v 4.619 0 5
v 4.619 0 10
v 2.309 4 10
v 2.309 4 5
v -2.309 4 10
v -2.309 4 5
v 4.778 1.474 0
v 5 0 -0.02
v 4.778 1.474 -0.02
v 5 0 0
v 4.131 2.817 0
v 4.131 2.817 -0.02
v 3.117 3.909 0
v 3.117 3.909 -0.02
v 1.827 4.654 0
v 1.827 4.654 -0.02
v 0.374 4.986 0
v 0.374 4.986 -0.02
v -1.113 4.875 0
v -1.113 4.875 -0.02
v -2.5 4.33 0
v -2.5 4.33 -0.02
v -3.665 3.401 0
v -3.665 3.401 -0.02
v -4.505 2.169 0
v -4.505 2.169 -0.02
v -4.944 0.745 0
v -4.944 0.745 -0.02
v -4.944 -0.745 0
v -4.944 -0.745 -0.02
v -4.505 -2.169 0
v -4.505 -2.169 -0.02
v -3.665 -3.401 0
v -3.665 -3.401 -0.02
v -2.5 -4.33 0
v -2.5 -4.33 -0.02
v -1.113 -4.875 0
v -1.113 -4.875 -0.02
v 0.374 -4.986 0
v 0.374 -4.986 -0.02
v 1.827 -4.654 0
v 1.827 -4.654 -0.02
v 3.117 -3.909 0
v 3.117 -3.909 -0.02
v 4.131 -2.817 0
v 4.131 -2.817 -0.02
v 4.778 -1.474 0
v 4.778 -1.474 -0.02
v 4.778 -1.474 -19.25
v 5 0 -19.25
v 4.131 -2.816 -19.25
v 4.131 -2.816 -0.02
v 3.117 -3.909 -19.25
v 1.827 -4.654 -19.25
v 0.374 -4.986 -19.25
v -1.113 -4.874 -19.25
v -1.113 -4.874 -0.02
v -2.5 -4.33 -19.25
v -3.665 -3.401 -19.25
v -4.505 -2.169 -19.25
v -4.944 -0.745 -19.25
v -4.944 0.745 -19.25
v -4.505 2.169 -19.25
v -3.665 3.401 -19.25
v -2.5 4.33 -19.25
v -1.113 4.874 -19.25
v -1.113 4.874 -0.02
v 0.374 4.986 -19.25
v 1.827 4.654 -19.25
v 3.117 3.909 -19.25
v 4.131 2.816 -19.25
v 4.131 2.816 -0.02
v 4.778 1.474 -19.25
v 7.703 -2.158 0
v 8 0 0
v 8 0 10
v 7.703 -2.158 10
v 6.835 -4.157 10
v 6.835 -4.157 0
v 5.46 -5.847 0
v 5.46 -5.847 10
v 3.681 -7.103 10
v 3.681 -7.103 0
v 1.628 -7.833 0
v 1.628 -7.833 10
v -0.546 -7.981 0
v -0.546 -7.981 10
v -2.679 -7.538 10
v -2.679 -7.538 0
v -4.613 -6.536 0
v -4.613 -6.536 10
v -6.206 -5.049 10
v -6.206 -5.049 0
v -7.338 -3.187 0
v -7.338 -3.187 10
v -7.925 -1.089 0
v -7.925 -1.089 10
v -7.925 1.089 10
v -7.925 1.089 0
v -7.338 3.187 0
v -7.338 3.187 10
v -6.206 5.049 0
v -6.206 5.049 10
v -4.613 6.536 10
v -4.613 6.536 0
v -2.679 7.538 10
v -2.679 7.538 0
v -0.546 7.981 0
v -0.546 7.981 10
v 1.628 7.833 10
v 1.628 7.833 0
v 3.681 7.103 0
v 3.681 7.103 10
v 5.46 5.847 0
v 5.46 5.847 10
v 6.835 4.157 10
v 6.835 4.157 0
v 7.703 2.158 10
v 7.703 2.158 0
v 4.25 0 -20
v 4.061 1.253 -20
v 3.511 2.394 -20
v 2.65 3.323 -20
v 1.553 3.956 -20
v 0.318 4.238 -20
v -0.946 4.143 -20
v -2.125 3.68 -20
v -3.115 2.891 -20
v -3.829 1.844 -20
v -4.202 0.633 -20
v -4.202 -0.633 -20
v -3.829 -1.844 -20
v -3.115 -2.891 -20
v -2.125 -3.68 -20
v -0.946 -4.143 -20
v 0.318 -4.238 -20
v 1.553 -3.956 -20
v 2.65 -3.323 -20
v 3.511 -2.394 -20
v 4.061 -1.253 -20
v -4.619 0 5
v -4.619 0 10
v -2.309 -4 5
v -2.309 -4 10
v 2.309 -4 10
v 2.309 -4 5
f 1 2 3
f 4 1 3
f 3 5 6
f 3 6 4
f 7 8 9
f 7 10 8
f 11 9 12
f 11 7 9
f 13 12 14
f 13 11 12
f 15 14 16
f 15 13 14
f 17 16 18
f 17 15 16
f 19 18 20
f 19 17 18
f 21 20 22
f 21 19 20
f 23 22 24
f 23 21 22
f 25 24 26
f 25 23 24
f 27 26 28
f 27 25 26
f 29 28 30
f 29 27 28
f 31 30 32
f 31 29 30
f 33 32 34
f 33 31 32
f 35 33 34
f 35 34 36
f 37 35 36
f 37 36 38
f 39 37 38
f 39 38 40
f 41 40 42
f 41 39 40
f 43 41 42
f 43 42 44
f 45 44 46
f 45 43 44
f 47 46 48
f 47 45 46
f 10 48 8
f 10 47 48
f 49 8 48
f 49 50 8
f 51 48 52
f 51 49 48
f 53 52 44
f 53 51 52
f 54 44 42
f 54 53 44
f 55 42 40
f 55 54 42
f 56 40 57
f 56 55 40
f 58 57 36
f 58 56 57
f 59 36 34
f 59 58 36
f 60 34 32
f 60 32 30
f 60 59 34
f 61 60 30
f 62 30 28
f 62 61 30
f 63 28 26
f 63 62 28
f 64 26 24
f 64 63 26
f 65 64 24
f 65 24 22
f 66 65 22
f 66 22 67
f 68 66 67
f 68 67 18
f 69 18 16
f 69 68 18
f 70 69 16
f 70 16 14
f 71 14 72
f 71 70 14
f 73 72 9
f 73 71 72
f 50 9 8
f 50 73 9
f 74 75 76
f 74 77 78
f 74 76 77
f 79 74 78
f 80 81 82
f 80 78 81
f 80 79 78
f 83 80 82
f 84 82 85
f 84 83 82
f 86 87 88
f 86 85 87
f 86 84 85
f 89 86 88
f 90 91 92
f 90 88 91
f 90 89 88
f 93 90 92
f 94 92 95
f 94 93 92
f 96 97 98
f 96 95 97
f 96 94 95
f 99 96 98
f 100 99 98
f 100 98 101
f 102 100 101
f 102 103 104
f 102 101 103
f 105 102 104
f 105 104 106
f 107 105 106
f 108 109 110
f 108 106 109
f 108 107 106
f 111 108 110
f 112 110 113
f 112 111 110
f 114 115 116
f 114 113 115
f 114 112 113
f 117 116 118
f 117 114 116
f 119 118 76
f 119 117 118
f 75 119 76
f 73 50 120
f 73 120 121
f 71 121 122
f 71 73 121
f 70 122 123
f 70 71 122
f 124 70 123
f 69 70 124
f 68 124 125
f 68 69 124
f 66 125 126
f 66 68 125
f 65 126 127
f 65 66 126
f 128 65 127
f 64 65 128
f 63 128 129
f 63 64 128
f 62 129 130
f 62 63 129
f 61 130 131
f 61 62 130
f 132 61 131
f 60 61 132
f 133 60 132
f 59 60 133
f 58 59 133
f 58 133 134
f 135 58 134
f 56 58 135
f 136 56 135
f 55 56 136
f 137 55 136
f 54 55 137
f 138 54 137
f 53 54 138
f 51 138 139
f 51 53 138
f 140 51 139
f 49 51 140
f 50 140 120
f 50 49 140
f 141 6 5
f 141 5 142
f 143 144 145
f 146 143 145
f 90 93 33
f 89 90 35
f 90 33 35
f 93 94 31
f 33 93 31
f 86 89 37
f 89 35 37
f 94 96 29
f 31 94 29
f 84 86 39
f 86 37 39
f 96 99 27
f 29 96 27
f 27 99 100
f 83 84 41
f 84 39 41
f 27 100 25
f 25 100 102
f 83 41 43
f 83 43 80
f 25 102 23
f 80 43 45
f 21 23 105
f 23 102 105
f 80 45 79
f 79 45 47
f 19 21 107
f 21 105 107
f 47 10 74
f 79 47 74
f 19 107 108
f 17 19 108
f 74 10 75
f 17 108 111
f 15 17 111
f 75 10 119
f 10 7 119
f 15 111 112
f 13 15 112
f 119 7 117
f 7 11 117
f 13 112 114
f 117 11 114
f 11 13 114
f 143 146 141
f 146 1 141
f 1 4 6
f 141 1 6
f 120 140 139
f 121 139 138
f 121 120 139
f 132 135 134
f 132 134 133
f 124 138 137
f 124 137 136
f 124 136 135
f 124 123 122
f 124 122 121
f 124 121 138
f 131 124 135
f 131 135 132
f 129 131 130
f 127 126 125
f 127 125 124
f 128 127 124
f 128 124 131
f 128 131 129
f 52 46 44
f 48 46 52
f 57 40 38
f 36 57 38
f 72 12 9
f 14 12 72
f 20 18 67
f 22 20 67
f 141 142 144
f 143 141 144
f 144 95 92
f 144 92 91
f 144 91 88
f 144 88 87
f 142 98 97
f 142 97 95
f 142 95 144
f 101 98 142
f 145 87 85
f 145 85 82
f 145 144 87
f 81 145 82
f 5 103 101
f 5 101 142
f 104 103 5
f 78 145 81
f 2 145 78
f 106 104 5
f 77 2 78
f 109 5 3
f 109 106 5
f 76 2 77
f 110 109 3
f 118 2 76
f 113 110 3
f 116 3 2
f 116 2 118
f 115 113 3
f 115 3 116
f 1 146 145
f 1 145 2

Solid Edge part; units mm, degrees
sketch "Sketch1" plane through (0, 0, 0) normal (0, 0, 1) x (1, 0, 0)
  circle A0 centre (0, 0) radius 8
  dimension "D1" = 16
extrude "Protrusion1" add sketch "Sketch1" along normal blind 10
sketch "Sketch2" plane through (0, 0, 0) normal (0, 0, -1) x (1, 0, 0)
  circle A0 centre (0, 0) radius 5
extrude "Protrusion2" add sketch "Sketch2" along normal blind 20
sketch "Sketch3" plane through (0, 0, -20) normal (0, 0, -1) x (1, 0, 0)
  circle A0 centre (0, 0) radius 4.9997
extrude "Cutout1" cut sketch "Sketch3" against normal blind 19.98 flip side to cut
chamfer "Chamfer_1" distance 0.75 angle 45 1 edges at (-4.9997, 0, -20)
sketch "Sketch4" plane through (0, 0, 10) normal (0, 0, 1) x (1, 0, 0)
  line L0 (-2.3094, 4) -> (2.3094, 4)
  line L1 (4.6188, 0) -> (2.3094, 4)
  line L2 (2.3094, -4) -> (4.6188, 0)
  line L3 (-2.3094, -4) -> (2.3094, -4)
  line L4 (-4.6188, 0) -> (-2.3094, -4)
  line L5 (-2.3094, 4) -> (-4.6188, 0)
  dimension "D1" = 8
extrude "Cutout2" cut sketch "Sketch4" against normal blind 5
properties part number "24104591"
